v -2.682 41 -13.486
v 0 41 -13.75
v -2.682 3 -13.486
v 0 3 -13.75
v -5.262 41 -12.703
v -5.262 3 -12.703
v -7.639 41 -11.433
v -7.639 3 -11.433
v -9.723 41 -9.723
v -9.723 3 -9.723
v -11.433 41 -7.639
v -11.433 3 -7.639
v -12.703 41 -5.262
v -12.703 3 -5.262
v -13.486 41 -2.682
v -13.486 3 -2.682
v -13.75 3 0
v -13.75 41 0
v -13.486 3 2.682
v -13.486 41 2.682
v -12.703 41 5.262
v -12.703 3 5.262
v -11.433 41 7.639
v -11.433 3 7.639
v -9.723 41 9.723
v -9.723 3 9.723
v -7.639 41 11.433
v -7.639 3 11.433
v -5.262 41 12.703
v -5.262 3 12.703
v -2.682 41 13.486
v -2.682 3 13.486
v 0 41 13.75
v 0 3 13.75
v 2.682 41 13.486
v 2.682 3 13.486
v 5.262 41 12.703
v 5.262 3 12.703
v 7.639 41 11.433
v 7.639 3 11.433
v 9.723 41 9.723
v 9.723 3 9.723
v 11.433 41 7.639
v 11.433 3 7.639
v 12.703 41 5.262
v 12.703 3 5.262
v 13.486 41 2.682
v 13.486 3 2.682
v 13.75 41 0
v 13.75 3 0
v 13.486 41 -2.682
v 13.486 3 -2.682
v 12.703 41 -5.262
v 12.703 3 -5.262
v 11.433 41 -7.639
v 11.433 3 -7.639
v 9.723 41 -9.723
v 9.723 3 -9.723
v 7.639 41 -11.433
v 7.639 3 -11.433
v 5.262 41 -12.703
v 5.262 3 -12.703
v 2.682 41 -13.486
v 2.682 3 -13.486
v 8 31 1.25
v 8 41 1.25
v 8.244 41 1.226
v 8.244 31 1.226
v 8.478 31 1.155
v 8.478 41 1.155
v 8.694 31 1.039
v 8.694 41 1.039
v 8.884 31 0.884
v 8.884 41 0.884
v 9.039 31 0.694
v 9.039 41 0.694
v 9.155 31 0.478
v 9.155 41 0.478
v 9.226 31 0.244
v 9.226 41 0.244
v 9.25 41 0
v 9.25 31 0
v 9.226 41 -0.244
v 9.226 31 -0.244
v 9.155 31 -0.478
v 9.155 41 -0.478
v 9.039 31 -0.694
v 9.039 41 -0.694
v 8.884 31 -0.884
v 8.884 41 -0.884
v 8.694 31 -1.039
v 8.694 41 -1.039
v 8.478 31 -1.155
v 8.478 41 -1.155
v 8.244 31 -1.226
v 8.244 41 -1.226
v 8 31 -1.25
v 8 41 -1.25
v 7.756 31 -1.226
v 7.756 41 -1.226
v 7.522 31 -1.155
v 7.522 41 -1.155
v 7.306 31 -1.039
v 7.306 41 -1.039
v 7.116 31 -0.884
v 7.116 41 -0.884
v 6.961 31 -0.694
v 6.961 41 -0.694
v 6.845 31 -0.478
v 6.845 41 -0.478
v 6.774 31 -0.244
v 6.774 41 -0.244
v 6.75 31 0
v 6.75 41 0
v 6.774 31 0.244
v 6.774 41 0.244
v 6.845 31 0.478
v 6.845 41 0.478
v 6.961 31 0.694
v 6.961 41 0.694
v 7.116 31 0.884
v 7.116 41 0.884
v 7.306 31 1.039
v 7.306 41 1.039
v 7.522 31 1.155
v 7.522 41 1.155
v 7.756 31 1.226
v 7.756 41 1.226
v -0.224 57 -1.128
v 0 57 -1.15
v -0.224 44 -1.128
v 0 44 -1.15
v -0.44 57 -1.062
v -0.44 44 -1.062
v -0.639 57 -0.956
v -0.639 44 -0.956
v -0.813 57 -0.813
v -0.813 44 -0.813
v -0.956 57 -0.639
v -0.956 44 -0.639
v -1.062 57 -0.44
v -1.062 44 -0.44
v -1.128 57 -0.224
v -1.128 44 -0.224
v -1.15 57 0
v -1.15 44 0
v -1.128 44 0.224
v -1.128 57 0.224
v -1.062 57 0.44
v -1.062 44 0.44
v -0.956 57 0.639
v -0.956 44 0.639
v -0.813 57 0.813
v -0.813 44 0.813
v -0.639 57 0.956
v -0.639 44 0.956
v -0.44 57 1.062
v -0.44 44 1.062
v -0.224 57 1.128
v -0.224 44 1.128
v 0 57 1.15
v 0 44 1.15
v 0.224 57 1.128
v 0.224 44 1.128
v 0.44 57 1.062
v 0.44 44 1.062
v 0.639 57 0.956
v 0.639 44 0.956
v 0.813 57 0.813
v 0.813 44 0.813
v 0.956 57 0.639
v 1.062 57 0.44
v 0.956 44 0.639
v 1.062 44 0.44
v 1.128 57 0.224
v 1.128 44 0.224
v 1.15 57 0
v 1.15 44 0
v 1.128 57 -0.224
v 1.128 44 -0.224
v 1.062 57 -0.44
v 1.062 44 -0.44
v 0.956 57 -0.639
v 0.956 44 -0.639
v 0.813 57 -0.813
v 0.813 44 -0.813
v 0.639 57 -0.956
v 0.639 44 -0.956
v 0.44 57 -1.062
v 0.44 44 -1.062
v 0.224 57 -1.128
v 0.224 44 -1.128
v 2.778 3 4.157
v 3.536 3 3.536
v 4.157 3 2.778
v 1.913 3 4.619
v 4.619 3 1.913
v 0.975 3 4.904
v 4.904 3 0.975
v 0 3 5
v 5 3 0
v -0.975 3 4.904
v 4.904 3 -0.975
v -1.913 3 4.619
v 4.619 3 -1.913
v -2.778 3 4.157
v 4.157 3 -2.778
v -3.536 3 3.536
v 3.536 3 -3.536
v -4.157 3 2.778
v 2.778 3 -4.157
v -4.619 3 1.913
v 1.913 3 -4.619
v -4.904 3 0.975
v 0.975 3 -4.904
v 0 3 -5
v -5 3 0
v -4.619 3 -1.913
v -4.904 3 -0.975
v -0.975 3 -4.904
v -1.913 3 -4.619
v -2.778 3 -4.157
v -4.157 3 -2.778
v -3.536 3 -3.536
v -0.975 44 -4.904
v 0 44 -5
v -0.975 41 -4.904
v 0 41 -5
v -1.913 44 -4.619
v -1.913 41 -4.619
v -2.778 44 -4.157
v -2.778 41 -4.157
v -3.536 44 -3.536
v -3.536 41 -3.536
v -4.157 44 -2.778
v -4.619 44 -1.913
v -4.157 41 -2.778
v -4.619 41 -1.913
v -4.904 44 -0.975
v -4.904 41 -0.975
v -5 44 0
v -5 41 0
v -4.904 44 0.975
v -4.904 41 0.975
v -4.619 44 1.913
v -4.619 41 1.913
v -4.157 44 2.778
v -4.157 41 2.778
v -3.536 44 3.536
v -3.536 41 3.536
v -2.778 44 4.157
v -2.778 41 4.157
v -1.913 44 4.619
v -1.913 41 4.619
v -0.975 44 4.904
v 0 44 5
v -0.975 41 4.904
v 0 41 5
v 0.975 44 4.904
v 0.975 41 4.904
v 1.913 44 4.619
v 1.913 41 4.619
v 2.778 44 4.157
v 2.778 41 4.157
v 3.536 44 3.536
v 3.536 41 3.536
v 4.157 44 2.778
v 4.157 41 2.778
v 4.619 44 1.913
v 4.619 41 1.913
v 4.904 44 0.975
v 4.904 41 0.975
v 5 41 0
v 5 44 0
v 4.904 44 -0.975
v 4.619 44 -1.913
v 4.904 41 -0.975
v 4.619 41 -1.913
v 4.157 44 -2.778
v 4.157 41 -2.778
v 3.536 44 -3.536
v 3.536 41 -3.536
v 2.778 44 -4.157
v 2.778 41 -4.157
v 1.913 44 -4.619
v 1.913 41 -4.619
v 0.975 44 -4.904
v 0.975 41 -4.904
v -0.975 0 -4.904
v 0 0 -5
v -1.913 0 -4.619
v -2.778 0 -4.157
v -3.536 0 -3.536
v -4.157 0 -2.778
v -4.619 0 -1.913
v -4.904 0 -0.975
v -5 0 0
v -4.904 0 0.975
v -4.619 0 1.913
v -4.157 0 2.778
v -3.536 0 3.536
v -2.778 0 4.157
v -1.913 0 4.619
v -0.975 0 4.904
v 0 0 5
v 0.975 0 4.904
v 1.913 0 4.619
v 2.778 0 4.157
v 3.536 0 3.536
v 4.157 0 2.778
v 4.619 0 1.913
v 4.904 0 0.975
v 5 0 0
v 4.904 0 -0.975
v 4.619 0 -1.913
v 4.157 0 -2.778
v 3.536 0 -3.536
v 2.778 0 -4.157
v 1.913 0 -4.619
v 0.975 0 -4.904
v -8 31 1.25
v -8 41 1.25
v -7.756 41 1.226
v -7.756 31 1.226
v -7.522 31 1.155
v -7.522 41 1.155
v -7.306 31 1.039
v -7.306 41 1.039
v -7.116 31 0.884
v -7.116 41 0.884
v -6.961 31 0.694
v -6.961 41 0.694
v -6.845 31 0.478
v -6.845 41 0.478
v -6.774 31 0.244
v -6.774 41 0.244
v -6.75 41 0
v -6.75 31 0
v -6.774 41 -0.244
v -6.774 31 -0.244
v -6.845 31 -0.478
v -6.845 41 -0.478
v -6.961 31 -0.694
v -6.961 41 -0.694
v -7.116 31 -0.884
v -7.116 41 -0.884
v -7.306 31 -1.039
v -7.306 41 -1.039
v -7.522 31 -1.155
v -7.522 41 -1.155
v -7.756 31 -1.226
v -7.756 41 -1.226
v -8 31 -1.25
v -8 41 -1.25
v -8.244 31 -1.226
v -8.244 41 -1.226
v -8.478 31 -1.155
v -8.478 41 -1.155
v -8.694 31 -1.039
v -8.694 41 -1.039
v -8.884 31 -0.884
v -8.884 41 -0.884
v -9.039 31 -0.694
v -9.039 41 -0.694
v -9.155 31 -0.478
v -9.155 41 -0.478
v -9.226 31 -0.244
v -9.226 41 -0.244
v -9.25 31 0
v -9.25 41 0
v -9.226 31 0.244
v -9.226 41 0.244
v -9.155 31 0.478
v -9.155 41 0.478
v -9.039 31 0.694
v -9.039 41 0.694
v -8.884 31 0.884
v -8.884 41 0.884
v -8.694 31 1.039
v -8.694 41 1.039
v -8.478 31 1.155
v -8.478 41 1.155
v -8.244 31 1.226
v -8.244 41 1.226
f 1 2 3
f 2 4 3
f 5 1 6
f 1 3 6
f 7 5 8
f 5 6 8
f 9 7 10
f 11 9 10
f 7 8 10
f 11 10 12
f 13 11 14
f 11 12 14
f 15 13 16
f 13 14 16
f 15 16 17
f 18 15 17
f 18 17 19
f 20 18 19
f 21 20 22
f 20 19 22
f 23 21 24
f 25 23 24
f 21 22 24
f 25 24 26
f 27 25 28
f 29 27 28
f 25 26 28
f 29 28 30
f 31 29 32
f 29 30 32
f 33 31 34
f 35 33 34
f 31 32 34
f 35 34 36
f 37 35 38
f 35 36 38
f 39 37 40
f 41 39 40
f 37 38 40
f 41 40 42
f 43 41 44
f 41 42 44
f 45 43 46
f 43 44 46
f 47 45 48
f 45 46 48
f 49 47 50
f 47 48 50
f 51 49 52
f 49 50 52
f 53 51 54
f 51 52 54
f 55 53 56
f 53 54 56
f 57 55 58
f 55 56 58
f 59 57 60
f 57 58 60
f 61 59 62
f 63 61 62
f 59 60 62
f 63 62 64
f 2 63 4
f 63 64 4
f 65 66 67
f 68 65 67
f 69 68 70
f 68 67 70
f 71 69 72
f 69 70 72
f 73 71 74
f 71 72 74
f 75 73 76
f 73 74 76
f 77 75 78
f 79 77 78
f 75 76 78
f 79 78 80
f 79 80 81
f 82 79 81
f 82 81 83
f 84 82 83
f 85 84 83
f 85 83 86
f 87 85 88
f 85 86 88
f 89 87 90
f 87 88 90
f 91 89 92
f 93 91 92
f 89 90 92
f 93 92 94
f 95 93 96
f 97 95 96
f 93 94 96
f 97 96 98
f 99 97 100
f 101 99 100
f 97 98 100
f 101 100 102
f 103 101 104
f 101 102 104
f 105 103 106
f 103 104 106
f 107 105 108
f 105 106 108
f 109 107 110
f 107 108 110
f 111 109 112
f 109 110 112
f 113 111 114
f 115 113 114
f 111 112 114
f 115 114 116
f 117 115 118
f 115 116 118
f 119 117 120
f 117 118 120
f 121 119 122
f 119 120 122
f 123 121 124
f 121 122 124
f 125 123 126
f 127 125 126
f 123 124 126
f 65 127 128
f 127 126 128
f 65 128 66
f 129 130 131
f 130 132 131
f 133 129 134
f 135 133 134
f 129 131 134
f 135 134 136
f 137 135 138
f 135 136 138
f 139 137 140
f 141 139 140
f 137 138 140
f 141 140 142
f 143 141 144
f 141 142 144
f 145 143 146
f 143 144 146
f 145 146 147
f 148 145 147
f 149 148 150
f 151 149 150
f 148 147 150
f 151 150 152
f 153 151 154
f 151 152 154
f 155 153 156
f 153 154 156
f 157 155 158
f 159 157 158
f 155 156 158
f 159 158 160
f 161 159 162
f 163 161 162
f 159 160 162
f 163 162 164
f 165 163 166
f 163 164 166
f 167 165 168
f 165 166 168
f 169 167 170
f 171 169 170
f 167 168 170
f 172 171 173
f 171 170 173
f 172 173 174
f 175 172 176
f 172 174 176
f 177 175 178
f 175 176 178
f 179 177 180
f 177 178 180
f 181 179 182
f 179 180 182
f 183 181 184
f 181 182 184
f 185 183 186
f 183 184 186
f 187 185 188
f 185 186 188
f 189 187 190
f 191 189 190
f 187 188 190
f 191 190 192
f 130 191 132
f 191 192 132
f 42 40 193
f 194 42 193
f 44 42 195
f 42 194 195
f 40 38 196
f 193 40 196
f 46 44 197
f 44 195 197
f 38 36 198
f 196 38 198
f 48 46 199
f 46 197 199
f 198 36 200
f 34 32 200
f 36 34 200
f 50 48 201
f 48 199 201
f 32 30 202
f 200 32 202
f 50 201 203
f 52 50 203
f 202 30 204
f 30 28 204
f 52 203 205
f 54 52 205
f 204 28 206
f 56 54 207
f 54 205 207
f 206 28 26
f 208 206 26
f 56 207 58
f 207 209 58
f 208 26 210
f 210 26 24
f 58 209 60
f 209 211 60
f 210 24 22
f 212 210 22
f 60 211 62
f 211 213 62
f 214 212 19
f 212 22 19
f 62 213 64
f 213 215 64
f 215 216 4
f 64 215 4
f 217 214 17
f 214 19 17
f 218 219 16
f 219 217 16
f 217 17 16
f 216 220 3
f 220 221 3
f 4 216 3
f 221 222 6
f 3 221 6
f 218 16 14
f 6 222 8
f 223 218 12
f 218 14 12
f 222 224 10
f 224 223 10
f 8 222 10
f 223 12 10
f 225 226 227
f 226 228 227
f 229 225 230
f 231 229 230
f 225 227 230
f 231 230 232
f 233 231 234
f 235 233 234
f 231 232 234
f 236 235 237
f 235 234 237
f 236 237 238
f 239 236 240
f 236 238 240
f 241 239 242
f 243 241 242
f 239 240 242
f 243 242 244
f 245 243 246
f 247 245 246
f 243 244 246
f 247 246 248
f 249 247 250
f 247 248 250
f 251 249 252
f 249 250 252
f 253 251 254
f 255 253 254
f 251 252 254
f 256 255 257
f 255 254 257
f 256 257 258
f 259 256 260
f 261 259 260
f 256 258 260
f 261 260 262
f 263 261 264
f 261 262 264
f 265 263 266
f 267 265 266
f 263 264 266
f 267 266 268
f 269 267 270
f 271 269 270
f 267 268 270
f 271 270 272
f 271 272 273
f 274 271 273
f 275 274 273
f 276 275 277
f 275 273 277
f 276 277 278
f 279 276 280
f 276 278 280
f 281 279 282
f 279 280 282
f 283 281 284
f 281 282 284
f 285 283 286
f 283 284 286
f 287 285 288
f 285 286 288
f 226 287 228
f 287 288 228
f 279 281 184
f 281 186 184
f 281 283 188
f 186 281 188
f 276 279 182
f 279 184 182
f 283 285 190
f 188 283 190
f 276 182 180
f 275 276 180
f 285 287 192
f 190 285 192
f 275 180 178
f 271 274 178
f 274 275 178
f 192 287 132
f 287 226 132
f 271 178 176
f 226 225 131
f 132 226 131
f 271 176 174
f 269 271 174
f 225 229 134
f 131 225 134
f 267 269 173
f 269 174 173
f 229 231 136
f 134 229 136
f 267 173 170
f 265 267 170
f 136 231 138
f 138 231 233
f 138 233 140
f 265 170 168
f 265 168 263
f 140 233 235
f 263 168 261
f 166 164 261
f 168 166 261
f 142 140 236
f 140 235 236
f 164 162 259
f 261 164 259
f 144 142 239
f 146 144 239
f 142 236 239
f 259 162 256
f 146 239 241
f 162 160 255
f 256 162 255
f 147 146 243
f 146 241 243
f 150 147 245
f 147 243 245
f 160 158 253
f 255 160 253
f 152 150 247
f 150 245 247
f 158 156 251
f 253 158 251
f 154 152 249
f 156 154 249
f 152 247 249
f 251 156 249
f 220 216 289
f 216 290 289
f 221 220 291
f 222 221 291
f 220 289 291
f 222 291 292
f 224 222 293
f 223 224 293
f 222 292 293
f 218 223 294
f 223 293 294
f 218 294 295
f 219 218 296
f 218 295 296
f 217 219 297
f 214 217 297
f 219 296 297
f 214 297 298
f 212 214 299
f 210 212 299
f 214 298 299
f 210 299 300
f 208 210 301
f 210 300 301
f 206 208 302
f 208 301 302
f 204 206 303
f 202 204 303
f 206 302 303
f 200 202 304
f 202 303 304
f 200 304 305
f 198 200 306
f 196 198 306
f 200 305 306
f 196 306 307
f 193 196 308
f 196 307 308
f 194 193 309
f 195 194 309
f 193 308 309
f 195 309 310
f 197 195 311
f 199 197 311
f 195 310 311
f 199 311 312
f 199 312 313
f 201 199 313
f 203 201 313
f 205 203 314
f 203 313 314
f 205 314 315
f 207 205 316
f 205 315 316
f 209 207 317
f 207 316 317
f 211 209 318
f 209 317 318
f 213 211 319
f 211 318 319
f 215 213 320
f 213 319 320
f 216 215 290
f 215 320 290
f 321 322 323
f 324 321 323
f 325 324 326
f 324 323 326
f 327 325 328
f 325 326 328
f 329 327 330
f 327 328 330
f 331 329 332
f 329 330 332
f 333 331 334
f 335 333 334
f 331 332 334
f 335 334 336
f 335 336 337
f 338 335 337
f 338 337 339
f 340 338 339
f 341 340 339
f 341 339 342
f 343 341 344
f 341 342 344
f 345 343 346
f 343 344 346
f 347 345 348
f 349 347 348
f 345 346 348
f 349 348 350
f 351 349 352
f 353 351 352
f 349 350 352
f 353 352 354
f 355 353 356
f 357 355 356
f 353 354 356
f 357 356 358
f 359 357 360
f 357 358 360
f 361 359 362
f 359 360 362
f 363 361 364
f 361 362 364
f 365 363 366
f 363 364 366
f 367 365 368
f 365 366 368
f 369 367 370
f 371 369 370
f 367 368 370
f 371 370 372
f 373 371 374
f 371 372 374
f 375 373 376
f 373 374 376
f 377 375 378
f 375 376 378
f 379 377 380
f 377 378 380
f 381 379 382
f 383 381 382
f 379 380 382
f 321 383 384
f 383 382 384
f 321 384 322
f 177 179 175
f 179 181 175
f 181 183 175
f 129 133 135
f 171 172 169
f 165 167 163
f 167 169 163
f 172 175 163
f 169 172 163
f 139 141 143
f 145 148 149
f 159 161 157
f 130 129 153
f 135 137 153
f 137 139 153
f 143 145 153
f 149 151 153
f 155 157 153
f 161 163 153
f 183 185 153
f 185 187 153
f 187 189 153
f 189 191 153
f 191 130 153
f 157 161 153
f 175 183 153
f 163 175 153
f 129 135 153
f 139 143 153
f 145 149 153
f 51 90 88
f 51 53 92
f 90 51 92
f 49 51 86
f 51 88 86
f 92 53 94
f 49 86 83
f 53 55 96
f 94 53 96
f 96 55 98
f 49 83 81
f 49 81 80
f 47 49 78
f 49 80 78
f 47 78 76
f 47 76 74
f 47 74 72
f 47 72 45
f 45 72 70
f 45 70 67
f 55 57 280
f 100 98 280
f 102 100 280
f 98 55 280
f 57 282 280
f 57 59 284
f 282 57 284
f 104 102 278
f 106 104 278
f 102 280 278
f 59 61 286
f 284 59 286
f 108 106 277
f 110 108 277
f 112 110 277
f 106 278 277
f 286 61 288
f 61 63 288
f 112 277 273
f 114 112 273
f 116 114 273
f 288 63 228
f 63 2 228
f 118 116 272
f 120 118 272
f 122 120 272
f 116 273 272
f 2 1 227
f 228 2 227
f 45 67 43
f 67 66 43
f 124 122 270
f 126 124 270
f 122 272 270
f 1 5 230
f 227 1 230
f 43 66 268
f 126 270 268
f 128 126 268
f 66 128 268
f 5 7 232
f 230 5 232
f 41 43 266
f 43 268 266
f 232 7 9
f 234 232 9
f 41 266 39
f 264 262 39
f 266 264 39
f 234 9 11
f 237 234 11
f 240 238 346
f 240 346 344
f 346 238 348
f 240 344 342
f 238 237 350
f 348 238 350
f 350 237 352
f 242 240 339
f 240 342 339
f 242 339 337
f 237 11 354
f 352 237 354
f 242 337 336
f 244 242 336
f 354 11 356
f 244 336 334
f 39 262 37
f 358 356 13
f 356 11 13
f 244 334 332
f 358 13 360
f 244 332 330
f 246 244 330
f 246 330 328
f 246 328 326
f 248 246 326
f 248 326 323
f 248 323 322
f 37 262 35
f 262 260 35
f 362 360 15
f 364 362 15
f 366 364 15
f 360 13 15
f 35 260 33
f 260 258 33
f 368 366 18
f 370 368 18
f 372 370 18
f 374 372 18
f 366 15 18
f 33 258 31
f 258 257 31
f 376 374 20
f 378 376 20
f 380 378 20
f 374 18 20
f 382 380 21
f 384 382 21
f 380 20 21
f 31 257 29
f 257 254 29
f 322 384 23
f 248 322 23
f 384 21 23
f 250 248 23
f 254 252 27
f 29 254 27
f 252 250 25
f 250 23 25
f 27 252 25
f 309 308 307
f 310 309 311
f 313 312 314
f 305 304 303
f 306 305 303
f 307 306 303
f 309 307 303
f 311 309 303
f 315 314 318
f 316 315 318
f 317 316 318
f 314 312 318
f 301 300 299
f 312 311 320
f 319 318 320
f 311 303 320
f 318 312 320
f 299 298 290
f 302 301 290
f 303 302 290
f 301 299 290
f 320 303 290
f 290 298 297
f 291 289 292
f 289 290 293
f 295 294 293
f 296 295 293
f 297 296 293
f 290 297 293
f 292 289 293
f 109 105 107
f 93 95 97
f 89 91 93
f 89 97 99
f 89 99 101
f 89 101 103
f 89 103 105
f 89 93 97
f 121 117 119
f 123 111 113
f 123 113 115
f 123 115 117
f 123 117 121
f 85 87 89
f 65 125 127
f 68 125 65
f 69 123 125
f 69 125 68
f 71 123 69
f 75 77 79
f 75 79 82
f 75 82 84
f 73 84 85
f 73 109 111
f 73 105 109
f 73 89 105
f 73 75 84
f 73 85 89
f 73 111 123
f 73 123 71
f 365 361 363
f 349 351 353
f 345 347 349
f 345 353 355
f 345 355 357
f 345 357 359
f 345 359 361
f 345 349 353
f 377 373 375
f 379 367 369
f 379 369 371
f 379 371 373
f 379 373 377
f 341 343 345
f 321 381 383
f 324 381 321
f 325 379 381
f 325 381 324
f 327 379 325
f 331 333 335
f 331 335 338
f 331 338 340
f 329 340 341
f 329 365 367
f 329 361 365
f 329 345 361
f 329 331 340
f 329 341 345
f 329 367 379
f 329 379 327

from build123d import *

# Parameters (mm, degrees)
SKETCH2_R          = 1.25
CUT_EXTRUDE1_DEPTH = 10


with BuildPart() as part:
    # Sketch1 → Revolve1 (revolve)
    with BuildSketch(Plane(origin=(0, 0, 0), x_dir=(0, 0, -1), z_dir=(1, 0, 0)), mode=Mode.PRIVATE) as revolve1_sk:
        Polygon((0, 57), (-1.15, 57), (-1.15, 44), (-5, 44), (-5, 41), (-13.75, 41), (-13.75, 3), (-5, 3), (-5, 0), (0, 0), align=None)
    revolve(revolve1_sk.sketch.rotate(Axis((0, 0, 0), (0, 1, 0)), 180), axis=Axis((0, 0, 0), (0, 1, 0)))

    # Sketch2 → Cut-Extrude1 (cut)
    with BuildSketch(Plane(origin=(0, 41, 0), x_dir=(1, 0, 0), z_dir=(0, 1, 0))):
        with Locations(Location((-8, 0, 0), (0, 0, 270))):
            Circle(SKETCH2_R)
        with Locations(Location((8, 0, 0), (0, 0, 270))):
            Circle(SKETCH2_R)
    extrude(amount=-CUT_EXTRUDE1_DEPTH, mode=Mode.SUBTRACT)


solid = part.part
